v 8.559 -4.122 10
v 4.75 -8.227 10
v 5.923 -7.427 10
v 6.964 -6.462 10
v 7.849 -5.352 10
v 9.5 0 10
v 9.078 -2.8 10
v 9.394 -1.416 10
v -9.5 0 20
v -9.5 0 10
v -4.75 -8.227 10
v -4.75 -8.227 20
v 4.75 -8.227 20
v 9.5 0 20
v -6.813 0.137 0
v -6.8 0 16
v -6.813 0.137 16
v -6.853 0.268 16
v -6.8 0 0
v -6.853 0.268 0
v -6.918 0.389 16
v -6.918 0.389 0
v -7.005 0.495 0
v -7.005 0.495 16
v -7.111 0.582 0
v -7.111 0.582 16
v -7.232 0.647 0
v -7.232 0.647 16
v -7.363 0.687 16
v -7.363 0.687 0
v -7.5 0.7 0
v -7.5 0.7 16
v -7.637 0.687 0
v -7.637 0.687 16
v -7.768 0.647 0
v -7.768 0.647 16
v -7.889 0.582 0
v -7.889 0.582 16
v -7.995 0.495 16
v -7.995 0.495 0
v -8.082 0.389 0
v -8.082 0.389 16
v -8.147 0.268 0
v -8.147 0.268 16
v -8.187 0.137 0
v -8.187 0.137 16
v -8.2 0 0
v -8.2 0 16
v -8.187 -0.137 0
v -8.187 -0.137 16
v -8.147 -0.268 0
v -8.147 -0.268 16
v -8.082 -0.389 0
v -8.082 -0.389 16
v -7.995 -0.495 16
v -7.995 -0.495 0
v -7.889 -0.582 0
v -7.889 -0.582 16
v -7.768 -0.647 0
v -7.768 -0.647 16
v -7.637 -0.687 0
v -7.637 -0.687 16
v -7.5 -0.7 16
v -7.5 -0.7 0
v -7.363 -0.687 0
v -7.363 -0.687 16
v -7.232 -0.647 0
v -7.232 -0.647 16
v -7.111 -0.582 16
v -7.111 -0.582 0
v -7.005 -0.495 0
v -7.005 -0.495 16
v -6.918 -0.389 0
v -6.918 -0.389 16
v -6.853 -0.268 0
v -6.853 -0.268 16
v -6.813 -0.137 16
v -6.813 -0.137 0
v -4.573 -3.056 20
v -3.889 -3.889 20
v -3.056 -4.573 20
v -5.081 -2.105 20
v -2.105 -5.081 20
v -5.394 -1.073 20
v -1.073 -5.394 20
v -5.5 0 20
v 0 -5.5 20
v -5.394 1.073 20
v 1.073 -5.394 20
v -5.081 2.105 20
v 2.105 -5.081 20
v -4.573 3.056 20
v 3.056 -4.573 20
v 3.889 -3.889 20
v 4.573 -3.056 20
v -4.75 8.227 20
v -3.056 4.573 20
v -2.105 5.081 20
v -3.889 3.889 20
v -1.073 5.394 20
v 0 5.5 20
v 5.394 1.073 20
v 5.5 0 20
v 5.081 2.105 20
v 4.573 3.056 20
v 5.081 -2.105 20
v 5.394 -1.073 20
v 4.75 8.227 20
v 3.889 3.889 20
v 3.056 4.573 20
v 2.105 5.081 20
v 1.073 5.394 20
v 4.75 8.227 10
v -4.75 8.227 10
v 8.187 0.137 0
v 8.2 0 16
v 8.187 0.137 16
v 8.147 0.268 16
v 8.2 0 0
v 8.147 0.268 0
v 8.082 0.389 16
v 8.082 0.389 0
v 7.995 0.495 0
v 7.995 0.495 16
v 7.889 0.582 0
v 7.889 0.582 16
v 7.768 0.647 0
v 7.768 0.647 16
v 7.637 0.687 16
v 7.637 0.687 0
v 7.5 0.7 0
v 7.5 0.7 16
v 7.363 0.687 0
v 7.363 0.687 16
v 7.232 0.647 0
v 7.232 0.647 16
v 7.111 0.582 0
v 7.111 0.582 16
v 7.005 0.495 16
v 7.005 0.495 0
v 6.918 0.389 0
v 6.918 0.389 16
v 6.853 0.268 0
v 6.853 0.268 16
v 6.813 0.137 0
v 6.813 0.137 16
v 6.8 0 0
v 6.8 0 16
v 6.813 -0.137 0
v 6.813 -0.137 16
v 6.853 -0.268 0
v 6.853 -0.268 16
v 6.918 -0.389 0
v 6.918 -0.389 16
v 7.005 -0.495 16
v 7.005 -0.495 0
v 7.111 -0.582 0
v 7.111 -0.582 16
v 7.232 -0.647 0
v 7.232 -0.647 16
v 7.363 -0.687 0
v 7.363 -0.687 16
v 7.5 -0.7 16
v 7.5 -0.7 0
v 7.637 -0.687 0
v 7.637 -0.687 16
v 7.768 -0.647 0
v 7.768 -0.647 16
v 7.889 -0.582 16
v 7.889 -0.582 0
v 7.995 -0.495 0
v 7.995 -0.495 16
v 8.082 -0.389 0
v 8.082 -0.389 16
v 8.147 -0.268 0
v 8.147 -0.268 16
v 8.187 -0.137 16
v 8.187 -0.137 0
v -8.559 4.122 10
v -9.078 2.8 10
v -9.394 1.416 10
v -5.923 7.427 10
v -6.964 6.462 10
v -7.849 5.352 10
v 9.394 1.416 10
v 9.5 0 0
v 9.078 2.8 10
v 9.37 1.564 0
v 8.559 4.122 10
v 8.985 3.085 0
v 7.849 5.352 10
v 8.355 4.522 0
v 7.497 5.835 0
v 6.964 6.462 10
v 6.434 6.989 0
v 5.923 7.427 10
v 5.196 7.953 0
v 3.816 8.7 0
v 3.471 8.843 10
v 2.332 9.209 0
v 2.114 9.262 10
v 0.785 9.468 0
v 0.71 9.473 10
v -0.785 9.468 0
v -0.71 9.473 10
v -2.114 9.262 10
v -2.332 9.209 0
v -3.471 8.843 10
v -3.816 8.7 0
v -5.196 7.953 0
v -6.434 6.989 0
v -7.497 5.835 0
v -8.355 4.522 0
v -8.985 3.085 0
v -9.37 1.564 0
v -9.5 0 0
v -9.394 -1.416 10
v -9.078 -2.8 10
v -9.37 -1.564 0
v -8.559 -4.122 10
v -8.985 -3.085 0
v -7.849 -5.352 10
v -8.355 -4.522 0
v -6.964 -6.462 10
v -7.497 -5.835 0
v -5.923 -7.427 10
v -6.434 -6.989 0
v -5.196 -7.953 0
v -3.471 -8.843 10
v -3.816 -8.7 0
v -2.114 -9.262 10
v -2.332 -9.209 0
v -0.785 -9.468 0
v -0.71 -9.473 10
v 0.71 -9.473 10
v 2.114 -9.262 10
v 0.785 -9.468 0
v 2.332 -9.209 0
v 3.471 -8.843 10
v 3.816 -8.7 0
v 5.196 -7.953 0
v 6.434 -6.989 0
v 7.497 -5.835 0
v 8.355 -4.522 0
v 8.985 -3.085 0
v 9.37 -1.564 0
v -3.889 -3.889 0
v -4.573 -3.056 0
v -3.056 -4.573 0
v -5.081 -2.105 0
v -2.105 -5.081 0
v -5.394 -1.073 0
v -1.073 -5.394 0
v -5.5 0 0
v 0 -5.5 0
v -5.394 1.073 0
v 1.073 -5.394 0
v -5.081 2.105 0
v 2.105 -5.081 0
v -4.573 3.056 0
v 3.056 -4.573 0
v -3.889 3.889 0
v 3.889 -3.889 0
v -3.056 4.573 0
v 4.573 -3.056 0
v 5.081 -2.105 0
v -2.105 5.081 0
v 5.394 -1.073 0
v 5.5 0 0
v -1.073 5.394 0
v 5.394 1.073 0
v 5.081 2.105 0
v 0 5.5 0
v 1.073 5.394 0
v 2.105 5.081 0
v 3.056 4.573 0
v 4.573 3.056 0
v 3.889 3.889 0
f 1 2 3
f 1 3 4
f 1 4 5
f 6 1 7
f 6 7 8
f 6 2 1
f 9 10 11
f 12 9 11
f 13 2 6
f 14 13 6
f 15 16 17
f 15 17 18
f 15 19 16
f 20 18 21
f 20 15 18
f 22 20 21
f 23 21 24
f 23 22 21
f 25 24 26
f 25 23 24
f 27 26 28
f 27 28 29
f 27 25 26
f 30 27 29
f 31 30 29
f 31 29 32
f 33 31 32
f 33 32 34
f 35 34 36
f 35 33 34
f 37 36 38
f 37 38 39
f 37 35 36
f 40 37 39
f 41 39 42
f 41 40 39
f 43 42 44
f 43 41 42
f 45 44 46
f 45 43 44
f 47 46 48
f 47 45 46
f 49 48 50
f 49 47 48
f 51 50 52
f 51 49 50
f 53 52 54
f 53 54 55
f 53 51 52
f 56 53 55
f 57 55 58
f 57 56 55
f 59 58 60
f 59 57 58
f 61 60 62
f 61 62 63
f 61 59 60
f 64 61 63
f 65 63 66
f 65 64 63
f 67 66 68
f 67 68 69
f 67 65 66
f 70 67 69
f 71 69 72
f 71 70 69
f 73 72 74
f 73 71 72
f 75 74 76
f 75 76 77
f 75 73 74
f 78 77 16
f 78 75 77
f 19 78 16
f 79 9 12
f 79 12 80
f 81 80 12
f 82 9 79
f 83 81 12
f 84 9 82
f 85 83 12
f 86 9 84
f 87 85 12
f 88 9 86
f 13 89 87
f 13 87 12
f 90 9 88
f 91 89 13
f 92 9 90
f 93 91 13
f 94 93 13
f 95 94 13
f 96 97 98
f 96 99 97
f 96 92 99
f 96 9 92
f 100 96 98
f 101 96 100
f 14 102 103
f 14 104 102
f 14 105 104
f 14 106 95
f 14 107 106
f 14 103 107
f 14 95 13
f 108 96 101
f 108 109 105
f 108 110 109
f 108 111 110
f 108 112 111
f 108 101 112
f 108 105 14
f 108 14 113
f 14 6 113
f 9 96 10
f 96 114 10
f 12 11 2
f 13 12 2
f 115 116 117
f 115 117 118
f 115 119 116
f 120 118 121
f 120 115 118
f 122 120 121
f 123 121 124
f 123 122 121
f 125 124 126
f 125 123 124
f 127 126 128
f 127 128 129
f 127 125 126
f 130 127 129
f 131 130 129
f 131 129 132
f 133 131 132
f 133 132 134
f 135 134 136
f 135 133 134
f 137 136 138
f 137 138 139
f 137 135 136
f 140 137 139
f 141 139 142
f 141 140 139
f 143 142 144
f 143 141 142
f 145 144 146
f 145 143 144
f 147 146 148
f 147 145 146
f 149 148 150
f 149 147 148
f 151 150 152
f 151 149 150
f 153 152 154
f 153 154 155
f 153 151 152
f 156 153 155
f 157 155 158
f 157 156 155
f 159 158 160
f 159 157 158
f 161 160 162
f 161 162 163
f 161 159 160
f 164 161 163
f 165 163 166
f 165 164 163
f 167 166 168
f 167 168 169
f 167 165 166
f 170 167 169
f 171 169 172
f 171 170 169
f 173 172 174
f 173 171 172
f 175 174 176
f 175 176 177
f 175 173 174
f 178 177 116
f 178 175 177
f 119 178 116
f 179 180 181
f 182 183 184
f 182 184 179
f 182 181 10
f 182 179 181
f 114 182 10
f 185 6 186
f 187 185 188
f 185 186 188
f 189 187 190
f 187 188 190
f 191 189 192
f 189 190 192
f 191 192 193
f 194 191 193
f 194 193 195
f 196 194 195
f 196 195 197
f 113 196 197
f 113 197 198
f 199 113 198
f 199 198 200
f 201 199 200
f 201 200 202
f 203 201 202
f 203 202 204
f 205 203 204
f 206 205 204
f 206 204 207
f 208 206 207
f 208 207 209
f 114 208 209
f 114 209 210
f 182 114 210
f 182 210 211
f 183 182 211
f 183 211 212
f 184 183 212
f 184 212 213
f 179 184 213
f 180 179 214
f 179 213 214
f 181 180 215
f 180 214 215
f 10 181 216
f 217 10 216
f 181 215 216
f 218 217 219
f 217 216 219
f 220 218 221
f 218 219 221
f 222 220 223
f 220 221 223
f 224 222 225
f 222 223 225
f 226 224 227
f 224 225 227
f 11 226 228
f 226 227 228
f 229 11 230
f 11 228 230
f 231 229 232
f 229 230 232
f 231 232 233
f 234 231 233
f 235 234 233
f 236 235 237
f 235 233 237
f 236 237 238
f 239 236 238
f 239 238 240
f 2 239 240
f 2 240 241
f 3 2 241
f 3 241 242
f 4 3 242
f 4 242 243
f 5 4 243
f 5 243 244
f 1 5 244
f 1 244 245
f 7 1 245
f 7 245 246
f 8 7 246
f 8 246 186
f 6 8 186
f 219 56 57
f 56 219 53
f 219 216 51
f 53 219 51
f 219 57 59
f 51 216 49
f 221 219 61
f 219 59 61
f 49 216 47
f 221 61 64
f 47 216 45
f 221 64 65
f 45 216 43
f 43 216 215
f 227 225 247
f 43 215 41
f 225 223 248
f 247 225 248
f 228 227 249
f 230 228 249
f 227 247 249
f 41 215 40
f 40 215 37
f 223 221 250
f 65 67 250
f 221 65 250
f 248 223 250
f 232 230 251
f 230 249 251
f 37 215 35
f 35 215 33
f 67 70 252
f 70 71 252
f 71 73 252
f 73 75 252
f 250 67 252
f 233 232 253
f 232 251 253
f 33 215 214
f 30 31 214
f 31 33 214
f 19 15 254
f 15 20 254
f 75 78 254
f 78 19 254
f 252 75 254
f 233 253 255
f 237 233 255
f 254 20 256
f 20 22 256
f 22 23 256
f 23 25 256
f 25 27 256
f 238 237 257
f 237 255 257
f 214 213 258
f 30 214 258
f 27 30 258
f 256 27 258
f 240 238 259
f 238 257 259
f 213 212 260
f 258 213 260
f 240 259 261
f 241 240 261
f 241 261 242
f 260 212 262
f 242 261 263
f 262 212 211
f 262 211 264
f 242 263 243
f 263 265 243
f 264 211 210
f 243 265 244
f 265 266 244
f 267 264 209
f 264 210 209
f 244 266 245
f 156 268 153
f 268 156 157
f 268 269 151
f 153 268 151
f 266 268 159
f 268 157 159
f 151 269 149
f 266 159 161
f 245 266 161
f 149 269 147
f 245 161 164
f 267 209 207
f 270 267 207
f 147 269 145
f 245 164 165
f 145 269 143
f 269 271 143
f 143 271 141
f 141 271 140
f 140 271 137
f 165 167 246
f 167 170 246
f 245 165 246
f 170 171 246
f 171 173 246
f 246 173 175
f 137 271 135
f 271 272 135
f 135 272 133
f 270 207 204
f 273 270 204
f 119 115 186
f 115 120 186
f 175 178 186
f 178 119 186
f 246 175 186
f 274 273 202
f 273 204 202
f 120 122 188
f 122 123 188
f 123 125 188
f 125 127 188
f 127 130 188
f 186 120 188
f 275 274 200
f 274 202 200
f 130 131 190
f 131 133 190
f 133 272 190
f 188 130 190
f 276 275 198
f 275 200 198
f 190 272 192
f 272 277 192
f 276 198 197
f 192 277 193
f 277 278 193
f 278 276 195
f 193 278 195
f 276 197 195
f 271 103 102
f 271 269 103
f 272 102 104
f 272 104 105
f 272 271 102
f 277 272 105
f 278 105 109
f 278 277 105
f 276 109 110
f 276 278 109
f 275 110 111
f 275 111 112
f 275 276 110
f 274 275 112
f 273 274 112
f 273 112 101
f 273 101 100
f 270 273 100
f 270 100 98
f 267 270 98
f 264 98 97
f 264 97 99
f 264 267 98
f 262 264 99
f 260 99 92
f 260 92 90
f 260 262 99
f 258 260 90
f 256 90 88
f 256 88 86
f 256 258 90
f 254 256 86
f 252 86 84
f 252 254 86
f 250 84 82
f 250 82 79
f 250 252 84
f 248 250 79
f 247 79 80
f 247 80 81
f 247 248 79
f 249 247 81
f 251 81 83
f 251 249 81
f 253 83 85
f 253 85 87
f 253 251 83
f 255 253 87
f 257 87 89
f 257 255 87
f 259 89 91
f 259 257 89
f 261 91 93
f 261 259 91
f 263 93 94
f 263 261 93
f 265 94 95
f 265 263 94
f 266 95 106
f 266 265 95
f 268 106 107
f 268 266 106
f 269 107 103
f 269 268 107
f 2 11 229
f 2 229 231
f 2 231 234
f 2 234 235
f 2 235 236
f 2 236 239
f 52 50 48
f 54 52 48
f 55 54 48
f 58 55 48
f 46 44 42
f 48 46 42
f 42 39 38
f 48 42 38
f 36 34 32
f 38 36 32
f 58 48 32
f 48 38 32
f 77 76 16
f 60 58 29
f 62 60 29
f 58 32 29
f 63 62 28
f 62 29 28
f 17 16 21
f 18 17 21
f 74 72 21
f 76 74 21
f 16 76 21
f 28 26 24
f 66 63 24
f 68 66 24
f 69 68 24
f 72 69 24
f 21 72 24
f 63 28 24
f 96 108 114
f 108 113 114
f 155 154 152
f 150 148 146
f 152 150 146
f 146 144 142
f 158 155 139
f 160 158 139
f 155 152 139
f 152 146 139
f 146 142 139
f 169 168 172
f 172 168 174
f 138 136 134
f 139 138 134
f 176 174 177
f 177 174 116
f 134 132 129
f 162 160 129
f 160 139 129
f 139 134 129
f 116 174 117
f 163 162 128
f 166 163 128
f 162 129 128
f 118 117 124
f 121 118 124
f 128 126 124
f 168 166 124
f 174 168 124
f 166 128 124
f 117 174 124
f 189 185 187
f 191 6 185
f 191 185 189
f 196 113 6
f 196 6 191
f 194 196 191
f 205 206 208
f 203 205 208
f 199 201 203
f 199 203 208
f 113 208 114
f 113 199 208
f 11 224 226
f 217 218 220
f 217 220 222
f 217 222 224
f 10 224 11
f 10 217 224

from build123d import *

# Parameters (mm, degrees)
F0_R     = 9.5
F0_R_2   = 0.7
F0_R_3   = 5.5
F1_DEPTH = 10
F2_DEPTH = 5
F3_R     = 0.7
F3_R_2   = 5.5
F4_DEPTH = 6
F5_R     = 0.7
F5_R_2   = 5.5
F6_DEPTH = 4


with BuildPart() as f1:
    # F0 (on Top) → F1 (new body)
    with BuildSketch(Plane.XY):
        Circle(F0_R)
        with Locations((-7.5, 0)):
            Circle(F0_R_2, mode=Mode.SUBTRACT)
        Circle(F0_R_3, mode=Mode.SUBTRACT)
        with Locations((7.5, 0)):
            Circle(F0_R_2, mode=Mode.SUBTRACT)
    extrude(amount=F1_DEPTH)

    # F0 (on Top) → F2 (cut)
    with BuildSketch(Plane.XY):
        Circle(F0_R_3)
    extrude(amount=F2_DEPTH, mode=Mode.SUBTRACT)

    # F3 (on face) → F4 (join)
    with BuildSketch(Plane.XY.offset(10)):
        Polygon((4.75, -8.227241336), (9.5, 0), (4.75, 8.227241336), (-4.75, 8.227241336), (-9.5, 0), (-4.75, -8.227241336), align=None)
        with Locations((-7.5, 0)):
            Circle(F3_R, mode=Mode.SUBTRACT)
        Circle(F3_R_2, mode=Mode.SUBTRACT)
        with Locations((7.5, 0)):
            Circle(F3_R, mode=Mode.SUBTRACT)
    extrude(amount=F4_DEPTH)

    # F5 (on face) → F6 (join)
    with BuildSketch(Plane.XY.offset(16)):
        Polygon((4.75, -8.227241336), (9.5, 0), (4.75, 8.227241336), (-4.75, 8.227241336), (-9.5, 0), (-4.75, -8.227241336), align=None)
        with Locations((-7.5, 0)):
            Circle(F5_R, mode=Mode.SUBTRACT)
        Circle(F5_R_2, mode=Mode.SUBTRACT)
        with Locations((7.5, 0)):
            Circle(F5_R, mode=Mode.SUBTRACT)
        with Locations((-7.5, 0)):
            Circle(F5_R)
        with Locations((7.5, 0)):
            Circle(F5_R)
    extrude(amount=F6_DEPTH)


solid = f1.part
